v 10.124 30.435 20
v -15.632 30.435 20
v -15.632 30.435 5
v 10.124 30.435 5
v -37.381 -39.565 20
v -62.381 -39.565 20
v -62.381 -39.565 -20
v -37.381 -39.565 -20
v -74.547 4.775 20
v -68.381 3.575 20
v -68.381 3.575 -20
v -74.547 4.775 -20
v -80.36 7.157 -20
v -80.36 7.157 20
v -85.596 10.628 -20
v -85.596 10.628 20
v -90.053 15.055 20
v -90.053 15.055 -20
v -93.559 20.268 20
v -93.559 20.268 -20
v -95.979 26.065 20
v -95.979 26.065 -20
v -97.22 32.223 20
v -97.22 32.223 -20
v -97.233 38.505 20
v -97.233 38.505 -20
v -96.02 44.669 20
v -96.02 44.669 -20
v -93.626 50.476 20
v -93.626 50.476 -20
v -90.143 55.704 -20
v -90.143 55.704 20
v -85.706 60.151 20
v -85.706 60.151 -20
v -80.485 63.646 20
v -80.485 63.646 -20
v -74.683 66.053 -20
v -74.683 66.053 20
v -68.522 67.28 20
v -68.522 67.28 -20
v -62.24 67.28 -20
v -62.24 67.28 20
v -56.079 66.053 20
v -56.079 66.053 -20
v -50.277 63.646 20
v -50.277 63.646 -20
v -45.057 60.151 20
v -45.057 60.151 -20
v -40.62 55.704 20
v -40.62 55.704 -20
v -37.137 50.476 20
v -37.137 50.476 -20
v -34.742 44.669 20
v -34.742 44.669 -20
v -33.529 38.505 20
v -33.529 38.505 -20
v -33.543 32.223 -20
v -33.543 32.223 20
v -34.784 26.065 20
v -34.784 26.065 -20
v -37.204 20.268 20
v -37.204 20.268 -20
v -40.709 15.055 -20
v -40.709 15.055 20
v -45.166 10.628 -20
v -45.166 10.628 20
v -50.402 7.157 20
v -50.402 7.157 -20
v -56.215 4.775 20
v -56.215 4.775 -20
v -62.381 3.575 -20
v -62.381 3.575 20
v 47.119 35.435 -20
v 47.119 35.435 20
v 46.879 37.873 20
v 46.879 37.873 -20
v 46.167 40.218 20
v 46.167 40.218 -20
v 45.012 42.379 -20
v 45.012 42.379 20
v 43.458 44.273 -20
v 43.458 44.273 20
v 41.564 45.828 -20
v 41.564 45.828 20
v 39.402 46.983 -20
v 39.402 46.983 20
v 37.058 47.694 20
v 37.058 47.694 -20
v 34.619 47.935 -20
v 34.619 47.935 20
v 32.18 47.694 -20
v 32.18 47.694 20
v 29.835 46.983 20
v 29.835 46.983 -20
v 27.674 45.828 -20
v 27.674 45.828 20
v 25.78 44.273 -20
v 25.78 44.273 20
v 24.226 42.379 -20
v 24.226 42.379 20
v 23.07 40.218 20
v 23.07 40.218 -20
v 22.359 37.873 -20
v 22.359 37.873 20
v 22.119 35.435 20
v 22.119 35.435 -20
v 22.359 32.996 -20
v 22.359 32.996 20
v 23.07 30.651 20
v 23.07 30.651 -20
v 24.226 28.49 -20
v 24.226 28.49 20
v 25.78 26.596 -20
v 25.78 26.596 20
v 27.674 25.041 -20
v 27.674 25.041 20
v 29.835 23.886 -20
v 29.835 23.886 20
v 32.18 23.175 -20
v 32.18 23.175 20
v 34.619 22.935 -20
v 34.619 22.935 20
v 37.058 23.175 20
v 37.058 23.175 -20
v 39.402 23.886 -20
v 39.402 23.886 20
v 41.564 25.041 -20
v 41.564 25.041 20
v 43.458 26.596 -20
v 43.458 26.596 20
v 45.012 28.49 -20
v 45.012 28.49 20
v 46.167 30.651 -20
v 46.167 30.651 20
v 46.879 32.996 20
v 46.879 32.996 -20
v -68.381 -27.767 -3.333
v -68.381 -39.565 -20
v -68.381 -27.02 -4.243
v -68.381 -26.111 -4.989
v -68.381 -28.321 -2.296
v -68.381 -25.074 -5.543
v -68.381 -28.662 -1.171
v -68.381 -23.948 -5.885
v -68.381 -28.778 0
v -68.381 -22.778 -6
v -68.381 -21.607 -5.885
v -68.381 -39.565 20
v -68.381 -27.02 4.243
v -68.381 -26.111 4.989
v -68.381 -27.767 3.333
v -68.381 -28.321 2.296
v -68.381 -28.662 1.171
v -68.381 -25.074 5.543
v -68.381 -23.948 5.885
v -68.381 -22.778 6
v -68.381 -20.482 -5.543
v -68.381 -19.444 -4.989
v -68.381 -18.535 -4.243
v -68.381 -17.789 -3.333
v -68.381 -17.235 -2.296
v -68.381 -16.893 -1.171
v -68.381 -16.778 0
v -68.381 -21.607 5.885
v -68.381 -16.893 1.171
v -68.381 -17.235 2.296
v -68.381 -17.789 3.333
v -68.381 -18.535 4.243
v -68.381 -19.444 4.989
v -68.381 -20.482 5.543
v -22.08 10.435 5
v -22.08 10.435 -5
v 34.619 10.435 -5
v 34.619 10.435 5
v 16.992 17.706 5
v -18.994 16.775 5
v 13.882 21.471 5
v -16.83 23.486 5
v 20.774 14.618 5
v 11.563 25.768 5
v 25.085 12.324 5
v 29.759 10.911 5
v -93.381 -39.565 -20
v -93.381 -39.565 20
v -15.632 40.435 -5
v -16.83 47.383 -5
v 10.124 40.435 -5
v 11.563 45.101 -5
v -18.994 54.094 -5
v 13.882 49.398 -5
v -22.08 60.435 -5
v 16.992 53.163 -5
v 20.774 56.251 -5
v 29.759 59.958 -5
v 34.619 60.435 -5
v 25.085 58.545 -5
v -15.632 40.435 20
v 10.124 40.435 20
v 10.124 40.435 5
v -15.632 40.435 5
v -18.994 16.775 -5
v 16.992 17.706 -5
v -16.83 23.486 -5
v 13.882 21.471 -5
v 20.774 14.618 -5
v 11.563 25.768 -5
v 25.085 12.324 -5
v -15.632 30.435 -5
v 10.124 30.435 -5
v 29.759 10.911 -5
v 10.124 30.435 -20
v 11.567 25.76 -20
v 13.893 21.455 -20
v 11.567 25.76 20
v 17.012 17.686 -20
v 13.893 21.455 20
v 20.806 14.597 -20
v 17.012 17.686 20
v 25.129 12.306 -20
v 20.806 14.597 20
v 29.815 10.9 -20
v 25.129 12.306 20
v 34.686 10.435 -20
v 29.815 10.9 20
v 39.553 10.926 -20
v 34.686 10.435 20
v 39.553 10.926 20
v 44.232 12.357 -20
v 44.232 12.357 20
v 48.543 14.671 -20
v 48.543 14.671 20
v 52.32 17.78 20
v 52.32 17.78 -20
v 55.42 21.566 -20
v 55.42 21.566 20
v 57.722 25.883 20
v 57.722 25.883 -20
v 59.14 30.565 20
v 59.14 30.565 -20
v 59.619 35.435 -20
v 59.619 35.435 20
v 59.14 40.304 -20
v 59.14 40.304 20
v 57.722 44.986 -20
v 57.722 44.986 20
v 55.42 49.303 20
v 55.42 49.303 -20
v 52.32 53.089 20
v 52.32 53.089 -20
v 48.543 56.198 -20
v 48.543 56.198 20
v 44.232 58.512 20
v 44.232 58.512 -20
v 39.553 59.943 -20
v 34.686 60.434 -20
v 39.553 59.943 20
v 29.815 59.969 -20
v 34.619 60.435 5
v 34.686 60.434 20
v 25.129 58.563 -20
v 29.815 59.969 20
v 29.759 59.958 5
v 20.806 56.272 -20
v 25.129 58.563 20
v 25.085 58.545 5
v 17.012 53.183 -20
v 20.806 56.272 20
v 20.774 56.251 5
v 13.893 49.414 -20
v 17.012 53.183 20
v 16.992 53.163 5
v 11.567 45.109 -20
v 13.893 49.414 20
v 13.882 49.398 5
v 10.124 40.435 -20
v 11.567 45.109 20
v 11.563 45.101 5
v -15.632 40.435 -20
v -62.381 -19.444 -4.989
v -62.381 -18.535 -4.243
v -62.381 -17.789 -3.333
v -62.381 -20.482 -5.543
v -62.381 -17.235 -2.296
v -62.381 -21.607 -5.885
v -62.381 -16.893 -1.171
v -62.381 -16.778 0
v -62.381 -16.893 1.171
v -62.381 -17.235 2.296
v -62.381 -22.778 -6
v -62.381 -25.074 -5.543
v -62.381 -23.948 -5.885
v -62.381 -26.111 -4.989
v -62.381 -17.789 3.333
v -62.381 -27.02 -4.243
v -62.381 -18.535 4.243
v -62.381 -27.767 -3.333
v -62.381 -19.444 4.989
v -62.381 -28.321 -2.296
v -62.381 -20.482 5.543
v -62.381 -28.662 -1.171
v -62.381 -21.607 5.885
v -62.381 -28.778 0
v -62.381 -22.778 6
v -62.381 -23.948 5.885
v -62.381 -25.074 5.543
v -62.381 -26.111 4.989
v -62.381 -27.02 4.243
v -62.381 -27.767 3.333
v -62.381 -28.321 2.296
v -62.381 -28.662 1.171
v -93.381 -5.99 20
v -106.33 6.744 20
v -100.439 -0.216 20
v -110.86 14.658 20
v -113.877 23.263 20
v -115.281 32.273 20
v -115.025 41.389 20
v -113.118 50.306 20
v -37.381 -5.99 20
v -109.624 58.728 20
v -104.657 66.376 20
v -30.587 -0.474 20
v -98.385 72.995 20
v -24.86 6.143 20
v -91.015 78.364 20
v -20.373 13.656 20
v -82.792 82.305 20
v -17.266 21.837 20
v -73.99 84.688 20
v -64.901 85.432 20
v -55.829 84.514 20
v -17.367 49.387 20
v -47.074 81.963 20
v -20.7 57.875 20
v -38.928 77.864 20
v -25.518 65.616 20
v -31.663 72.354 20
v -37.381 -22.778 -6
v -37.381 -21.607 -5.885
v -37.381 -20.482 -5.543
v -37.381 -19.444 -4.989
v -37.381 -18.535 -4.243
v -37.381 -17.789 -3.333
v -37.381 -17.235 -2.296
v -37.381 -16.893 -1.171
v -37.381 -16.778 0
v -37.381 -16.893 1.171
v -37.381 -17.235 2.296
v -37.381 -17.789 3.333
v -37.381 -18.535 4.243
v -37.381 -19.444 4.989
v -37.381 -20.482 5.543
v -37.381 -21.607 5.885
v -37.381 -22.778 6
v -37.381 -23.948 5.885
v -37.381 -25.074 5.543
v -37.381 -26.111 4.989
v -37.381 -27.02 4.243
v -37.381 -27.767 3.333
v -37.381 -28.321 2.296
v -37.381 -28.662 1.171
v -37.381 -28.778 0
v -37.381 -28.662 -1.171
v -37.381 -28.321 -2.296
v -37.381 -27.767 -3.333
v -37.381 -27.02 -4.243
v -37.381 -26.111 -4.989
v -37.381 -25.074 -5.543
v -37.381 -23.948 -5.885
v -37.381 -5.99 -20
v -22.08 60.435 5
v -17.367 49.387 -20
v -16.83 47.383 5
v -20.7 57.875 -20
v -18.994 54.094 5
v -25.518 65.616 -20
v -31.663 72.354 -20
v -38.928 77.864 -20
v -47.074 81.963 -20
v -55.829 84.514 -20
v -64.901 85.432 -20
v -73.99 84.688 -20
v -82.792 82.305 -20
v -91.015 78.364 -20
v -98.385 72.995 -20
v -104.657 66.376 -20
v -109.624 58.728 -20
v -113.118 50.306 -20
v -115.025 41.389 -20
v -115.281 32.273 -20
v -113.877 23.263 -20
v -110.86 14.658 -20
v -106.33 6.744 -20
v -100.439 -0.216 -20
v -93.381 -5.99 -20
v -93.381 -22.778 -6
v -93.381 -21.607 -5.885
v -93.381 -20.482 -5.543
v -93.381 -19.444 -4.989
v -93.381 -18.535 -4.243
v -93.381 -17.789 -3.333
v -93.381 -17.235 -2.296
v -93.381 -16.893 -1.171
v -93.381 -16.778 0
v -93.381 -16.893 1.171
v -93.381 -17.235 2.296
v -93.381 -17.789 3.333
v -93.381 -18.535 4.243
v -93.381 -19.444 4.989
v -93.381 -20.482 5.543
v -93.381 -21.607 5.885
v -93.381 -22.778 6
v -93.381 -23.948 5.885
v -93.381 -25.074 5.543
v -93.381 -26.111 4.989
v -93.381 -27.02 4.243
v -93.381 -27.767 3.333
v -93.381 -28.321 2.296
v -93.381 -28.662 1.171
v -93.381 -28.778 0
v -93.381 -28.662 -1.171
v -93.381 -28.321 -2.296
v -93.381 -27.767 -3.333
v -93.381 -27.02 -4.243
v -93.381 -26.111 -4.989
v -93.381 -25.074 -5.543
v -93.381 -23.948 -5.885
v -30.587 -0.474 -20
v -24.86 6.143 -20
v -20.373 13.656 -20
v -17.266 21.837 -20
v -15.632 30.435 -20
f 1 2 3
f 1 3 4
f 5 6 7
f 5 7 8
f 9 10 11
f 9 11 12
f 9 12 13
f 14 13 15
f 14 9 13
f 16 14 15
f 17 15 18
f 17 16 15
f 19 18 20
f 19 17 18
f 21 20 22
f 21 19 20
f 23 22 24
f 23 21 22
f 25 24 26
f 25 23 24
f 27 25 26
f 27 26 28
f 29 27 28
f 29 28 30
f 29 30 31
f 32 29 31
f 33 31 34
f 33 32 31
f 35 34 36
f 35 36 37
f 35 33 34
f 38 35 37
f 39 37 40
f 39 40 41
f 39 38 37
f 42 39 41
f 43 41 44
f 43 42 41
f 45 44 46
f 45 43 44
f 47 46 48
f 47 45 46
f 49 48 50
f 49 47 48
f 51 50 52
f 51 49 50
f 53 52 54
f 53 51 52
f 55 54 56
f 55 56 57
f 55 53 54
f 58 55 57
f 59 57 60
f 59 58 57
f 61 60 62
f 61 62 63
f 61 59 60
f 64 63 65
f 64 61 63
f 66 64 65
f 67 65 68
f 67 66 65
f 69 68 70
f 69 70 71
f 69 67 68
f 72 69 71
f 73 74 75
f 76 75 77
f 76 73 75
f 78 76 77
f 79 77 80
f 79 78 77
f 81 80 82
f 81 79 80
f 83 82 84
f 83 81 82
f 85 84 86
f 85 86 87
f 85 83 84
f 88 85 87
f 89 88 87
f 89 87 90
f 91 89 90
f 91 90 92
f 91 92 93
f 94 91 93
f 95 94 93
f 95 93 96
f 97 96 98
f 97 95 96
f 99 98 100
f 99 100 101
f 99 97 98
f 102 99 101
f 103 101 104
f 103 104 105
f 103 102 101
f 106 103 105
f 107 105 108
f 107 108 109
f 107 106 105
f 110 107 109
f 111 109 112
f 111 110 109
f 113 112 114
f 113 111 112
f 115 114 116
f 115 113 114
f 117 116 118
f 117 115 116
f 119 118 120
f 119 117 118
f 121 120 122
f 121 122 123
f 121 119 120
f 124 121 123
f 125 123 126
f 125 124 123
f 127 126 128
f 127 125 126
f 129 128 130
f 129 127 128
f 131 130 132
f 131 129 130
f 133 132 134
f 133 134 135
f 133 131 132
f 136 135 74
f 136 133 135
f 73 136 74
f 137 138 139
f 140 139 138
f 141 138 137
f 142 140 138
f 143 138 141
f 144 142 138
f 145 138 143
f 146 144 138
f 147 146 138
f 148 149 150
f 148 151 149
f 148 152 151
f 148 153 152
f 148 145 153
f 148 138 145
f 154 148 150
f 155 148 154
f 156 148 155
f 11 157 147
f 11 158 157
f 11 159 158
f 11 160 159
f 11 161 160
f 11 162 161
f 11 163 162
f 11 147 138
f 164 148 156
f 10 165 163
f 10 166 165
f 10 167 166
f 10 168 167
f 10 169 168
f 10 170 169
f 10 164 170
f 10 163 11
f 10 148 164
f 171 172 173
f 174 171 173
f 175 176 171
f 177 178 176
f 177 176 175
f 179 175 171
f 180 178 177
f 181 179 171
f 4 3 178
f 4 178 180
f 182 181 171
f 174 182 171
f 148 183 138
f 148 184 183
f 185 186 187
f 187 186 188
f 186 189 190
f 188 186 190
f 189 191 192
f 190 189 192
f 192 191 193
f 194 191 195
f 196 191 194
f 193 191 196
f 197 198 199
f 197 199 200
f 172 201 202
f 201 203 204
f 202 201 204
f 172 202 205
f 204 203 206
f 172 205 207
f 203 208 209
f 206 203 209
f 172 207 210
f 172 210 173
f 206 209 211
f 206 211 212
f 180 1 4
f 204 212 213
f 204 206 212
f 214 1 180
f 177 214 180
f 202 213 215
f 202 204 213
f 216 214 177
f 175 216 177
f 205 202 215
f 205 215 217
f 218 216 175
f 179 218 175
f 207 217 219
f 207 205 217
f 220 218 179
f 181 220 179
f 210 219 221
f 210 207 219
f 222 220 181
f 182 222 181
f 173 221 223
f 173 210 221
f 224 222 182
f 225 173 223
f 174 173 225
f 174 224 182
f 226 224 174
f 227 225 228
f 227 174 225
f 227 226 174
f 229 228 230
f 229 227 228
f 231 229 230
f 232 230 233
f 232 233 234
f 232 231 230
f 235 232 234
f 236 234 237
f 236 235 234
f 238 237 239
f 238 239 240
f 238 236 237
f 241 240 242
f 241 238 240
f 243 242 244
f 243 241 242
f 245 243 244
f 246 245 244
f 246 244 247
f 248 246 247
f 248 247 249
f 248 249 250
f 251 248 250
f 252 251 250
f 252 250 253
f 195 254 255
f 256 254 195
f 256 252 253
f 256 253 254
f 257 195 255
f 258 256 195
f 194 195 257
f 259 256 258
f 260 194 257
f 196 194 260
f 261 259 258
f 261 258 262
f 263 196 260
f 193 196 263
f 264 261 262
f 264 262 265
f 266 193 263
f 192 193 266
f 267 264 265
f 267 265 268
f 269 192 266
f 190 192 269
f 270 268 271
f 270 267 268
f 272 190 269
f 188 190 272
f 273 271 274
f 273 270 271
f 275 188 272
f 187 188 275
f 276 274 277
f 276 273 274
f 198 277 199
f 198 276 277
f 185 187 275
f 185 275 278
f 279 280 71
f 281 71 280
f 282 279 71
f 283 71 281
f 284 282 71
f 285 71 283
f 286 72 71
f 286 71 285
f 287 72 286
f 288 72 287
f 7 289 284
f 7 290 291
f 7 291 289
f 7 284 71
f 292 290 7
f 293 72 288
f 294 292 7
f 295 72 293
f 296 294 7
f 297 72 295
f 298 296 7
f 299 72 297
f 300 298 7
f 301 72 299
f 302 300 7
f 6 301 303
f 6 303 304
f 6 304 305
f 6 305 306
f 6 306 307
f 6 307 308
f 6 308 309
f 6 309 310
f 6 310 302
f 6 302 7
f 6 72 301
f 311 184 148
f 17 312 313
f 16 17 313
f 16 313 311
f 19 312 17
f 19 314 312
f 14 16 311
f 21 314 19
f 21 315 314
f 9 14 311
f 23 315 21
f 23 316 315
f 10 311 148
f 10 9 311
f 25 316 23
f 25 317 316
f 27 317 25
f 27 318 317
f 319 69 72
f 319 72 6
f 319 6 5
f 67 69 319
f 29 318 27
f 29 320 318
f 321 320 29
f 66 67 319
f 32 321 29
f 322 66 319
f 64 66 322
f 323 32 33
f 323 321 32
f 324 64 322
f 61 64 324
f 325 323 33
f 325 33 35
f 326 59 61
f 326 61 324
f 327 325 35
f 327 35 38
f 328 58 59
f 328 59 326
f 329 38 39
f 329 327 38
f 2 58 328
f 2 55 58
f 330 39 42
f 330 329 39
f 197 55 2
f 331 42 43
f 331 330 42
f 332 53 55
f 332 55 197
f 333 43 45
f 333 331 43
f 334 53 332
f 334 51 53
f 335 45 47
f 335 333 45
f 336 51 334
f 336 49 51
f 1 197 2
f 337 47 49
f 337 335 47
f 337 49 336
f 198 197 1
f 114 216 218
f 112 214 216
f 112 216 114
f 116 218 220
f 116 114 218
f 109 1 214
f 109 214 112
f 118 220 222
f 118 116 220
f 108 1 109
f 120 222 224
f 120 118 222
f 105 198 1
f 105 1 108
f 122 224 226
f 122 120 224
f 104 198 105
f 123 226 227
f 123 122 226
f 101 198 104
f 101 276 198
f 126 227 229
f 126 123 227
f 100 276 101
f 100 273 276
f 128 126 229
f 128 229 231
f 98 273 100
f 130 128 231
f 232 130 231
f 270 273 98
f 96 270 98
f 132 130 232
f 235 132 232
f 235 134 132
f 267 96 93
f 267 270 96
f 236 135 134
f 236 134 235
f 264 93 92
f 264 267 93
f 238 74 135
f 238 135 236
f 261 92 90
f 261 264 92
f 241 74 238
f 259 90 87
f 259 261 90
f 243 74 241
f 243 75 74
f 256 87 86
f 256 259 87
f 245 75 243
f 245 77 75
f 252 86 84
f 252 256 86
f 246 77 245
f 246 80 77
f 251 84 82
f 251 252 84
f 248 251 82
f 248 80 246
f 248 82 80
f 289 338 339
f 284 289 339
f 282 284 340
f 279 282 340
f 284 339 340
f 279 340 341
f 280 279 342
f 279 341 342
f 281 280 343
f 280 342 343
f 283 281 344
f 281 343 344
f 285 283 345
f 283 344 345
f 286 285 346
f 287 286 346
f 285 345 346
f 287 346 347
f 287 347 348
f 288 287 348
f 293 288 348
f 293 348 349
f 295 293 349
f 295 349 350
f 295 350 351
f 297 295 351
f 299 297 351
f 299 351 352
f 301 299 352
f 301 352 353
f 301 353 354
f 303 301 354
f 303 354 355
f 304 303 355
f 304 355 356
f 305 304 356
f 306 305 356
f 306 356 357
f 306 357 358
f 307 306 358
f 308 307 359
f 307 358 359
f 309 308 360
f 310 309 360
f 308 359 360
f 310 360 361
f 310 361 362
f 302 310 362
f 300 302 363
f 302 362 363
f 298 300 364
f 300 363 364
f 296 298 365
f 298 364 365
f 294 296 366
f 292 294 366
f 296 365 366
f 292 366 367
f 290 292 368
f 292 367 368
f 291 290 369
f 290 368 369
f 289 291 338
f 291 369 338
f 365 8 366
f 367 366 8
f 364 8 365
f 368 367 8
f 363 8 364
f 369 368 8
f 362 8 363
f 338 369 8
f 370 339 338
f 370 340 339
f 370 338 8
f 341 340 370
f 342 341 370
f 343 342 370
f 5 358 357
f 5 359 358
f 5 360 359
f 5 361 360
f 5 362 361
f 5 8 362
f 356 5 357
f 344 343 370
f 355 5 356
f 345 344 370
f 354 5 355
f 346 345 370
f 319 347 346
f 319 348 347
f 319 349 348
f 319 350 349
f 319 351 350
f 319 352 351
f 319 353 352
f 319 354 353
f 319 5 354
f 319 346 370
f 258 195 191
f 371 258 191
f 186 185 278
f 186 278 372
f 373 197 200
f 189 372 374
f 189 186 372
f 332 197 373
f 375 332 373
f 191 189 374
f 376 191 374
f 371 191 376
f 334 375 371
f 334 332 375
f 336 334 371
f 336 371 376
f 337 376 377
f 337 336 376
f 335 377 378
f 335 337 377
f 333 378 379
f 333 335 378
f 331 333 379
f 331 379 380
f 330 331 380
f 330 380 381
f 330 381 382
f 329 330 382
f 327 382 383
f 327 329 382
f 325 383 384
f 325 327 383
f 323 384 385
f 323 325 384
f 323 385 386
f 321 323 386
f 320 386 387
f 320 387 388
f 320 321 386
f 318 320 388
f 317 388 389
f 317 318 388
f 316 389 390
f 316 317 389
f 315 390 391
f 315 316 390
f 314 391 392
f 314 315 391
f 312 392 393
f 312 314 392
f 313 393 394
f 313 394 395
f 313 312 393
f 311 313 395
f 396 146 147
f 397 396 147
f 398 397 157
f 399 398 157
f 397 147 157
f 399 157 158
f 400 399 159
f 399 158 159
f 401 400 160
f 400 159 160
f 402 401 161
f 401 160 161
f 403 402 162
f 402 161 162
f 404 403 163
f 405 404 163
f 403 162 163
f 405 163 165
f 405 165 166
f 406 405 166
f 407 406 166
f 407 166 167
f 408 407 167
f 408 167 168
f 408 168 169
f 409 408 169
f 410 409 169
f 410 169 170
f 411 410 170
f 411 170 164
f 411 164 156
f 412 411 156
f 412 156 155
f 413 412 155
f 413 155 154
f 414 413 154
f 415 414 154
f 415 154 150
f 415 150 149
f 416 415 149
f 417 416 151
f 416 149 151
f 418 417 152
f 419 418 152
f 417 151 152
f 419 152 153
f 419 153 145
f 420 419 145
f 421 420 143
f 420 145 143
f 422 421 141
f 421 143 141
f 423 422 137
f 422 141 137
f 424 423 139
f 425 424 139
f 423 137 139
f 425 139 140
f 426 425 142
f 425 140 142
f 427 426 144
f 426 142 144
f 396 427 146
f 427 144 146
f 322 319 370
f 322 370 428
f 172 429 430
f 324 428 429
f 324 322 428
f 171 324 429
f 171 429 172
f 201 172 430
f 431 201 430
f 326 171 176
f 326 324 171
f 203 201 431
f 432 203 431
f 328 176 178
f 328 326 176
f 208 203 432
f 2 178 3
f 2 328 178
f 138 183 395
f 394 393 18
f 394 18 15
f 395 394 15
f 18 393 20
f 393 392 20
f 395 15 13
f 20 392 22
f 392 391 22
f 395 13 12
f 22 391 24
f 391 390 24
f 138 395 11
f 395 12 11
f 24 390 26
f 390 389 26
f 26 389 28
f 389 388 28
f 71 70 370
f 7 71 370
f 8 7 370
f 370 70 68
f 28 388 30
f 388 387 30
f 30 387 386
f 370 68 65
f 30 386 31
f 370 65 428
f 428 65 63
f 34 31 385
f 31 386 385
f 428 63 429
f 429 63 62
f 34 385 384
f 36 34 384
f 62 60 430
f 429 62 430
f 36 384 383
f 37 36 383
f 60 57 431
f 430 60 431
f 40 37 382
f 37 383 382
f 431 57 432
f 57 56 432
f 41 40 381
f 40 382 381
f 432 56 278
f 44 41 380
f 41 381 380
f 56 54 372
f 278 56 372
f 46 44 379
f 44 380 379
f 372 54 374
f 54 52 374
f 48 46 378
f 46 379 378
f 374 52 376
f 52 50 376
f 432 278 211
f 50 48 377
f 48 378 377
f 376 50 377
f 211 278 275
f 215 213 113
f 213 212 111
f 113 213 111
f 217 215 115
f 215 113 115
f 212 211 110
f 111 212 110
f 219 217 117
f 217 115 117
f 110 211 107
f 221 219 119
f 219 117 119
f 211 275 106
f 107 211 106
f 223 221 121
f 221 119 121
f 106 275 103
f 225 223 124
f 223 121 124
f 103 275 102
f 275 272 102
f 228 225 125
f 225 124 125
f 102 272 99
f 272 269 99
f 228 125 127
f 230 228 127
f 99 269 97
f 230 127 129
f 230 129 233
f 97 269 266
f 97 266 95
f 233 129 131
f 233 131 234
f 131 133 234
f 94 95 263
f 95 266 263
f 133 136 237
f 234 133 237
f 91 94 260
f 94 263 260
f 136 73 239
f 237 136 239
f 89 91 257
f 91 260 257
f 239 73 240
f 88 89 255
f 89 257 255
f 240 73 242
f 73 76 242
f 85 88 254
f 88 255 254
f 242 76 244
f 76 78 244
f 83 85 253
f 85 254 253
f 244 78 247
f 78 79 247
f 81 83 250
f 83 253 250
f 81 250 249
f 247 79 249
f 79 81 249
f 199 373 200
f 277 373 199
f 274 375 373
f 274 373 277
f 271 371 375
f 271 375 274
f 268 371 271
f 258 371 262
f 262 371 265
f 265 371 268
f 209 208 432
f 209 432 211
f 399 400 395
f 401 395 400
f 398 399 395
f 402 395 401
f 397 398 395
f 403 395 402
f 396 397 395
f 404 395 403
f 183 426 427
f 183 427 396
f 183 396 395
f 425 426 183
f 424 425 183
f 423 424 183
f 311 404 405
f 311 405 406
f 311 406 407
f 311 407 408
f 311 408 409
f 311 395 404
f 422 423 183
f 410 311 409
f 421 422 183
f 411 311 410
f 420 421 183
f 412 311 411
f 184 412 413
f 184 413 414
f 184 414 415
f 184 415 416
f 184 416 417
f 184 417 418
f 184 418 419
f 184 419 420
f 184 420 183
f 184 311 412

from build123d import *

# Parameters (mm, degrees)
SKETCH1_R                = 12.5
BOSS_EXTRUDE1_DEPTH      = 20
SKETCH2_R                = 6
CUT_EXTRUDE2_DEPTH       = 56
BOSS_EXTRUDE2_DEPTH      = 5
BOSS_EXTRUDE2_DEPTH_BACK = 5


with BuildPart() as part:
    # Sketch1 → Boss-Extrude1 (new, symmetric)
    with BuildSketch(Plane.XY):
        with BuildLine():
            Line((-68.381118609, -39.565472128), (-68.381118609, 3.575463228))
            ThreePointArc((-68.381118609, 3.575463228), (-65.381118609, 67.434527872), (-62.381118609, 3.575463228))
            Line((-62.381118609, 3.575463228), (-62.381118609, -39.565472128))
            Line((-62.381118609, -39.565472128), (-37.381118609, -39.565472128))
            Line((-37.381118609, -39.565472128), (-37.381118609, -5.990102483))
            ThreePointArc((-37.381118609, -5.990102483), (-22.451762335, 9.801143977), (-15.631746753, 30.434527872))
            Line((-15.631746753, 30.434527872), (10.123983964, 30.434527872))
            ThreePointArc((10.123983964, 30.434527872), (59.618881391, 35.434527872), (10.123983964, 40.434527872))
            Line((10.123983964, 40.434527872), (-15.631746753, 40.434527872))
            ThreePointArc((-15.631746753, 40.434527872), (-91.014502504, 78.363884146), (-93.381118609, -5.990102483))
            Line((-93.381118609, -5.990102483), (-93.381118609, -39.565472128))
            Line((-93.381118609, -39.565472128), (-68.381118609, -39.565472128))
        make_face()
        with Locations((34.618881391, 35.434527872)):
            Circle(SKETCH1_R, mode=Mode.SUBTRACT)
    extrude(amount=BOSS_EXTRUDE1_DEPTH, both=True)

    # Sketch2 → Cut-Extrude2 (cut)
    with BuildSketch(Plane(origin=(-37.381118609, 0, 0), x_dir=(0, 0, -1), z_dir=(1, 0, 0))):
        with Locations((0, -22.777787305)):
            Circle(SKETCH2_R)
    extrude(amount=-CUT_EXTRUDE2_DEPTH, mode=Mode.SUBTRACT)

    # Sketch7 → Boss-Extrude2 (add, two sides: drawn at the far end of the back side and taken through both)
    with BuildSketch(Plane.XY.offset(-BOSS_EXTRUDE2_DEPTH_BACK)):
        with BuildLine():
            ThreePointArc((10.123983964, 40.434527872), (18.807493091, 54.799444603), (34.618881391, 60.434527872))
            Line((34.618881391, 60.434527872), (-22.079848419, 60.434527872))
            ThreePointArc((-22.079848419, 60.434527872), (-17.793247294, 50.777099487), (-15.631746753, 40.434527872))
            Line((-15.631746753, 40.434527872), (10.123983964, 40.434527872))
        make_face()
        with BuildLine():
            Line((-22.079848419, 10.434527872), (34.618881391, 10.434527872))
            ThreePointArc((34.618881391, 10.434527872), (18.807493091, 16.069611141), (10.123983964, 30.434527872))
            Line((10.123983964, 30.434527872), (-15.631746753, 30.434527872))
            ThreePointArc((-15.631746753, 30.434527872), (-17.793247294, 20.091956256), (-22.079848419, 10.434527872))
        make_face()
    extrude(amount=BOSS_EXTRUDE2_DEPTH + BOSS_EXTRUDE2_DEPTH_BACK)


solid = part.part
